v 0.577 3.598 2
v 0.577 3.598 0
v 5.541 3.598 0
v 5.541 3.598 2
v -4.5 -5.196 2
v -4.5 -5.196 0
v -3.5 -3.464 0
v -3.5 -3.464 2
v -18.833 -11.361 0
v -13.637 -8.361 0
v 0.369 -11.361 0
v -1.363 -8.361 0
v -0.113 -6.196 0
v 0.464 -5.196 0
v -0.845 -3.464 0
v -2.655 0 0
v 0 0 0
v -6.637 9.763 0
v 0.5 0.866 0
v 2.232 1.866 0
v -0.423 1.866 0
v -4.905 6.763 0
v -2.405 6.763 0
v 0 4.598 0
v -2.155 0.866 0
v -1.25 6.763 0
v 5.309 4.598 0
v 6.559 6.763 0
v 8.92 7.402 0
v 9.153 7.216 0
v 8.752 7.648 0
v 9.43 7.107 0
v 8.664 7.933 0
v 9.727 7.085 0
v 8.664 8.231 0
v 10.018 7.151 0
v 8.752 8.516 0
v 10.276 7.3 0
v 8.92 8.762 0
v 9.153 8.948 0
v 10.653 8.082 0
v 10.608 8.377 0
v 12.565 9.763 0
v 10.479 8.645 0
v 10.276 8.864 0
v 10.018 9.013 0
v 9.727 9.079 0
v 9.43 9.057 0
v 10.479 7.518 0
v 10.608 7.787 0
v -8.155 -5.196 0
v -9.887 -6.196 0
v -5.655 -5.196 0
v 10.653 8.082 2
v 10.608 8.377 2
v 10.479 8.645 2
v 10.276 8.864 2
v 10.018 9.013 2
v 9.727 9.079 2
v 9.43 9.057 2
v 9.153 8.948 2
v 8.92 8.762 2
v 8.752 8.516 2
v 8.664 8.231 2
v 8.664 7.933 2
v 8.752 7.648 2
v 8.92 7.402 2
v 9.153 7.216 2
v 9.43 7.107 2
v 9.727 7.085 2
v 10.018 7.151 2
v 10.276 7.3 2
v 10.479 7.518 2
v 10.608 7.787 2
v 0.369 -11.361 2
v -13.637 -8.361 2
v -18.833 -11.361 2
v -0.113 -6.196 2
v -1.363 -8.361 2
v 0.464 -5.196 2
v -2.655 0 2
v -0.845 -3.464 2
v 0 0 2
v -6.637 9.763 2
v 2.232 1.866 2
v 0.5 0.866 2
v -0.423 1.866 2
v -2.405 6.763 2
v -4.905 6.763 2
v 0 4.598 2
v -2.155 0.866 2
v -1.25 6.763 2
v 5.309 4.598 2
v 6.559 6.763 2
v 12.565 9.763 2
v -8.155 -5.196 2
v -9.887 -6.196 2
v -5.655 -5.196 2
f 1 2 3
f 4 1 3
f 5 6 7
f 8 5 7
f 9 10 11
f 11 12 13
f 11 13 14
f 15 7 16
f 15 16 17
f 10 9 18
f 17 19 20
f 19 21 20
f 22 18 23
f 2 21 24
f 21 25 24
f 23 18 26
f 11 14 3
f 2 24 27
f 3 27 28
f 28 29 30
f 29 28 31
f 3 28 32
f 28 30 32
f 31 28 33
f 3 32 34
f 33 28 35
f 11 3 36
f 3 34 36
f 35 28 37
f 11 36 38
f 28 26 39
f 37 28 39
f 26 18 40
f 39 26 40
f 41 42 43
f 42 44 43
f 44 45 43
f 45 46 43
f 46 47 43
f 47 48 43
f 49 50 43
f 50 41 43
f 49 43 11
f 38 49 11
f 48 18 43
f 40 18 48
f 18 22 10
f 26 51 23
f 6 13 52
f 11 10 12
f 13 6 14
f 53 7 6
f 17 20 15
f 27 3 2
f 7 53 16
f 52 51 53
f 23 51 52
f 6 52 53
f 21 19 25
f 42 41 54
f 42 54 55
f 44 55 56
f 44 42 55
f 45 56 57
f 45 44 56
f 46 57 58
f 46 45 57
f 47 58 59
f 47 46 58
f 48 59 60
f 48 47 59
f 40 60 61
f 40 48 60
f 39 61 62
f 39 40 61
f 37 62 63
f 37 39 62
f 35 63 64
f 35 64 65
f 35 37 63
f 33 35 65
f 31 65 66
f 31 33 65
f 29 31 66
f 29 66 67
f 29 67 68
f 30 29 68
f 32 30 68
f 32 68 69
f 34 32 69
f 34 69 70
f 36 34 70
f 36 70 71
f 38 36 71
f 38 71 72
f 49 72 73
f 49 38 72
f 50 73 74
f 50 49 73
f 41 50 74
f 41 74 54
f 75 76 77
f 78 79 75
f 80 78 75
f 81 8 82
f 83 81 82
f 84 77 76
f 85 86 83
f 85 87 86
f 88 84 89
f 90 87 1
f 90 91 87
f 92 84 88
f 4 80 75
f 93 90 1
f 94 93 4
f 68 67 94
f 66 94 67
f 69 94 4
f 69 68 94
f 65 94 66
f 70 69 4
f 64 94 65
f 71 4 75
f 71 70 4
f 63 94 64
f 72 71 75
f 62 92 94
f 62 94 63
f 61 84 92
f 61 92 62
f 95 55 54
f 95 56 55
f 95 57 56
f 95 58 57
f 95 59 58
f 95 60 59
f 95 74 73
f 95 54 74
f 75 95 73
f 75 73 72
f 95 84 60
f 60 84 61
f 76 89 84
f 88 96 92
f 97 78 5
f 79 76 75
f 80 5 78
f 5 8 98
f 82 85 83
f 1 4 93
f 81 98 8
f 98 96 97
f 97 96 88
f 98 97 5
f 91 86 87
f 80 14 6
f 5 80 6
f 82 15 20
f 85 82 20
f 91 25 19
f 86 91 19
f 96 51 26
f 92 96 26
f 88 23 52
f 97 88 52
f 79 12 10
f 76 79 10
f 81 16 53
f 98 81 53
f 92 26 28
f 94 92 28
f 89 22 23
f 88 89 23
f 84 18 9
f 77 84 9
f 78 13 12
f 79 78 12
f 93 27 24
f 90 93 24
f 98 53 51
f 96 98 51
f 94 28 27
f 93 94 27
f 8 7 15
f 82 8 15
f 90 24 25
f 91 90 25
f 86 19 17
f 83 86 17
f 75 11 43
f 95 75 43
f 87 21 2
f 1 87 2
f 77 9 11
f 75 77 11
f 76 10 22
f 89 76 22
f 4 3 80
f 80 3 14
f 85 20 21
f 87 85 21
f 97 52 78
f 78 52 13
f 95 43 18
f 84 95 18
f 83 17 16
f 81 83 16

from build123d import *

# Parameters (mm, degrees)
F0_R     = 1
F1_DEPTH = 2


with BuildPart() as f1:
    # F0 (on Top) → F1 (new body)
    with BuildSketch(Plane.XY):
        Polygon((0.368802, -11.361216), (12.564955, 9.76314), (-6.636751, 9.76314), (-18.832904, -11.361216), align=None)
        Polygon((-4.5, -5.196152), (-3.5, -3.464102), (-0.845299, -3.464102), (2.232051, 1.866025), (-0.42265, 1.866025), (0.57735, 3.598076), (5.541452, 3.598076), (0.464102, -5.196152), align=None, mode=Mode.SUBTRACT)
        Polygon((-4.904701, 6.76314), (-2.404701, 6.76314), (-9.886751, -6.196152), (-0.113249, -6.196152), (-1.363249, -8.361216), (-13.636751, -8.361216), align=None, mode=Mode.SUBTRACT)
        Polygon((-5.654701, -5.196152), (-8.154701, -5.196152), (-1.25, 6.76314), (6.559401, 6.76314), (5.309401, 4.598076), (2.654701, 4.598076), (0, 4.598076), (-2.154701, 0.866025), (0.5, 0.866025), (0, 0), (-2.654701, 0), align=None, mode=Mode.SUBTRACT)
        with Locations((9.652769, 8.081789)):
            Circle(F0_R, mode=Mode.SUBTRACT)
    extrude(amount=F1_DEPTH)


solid = f1.part
